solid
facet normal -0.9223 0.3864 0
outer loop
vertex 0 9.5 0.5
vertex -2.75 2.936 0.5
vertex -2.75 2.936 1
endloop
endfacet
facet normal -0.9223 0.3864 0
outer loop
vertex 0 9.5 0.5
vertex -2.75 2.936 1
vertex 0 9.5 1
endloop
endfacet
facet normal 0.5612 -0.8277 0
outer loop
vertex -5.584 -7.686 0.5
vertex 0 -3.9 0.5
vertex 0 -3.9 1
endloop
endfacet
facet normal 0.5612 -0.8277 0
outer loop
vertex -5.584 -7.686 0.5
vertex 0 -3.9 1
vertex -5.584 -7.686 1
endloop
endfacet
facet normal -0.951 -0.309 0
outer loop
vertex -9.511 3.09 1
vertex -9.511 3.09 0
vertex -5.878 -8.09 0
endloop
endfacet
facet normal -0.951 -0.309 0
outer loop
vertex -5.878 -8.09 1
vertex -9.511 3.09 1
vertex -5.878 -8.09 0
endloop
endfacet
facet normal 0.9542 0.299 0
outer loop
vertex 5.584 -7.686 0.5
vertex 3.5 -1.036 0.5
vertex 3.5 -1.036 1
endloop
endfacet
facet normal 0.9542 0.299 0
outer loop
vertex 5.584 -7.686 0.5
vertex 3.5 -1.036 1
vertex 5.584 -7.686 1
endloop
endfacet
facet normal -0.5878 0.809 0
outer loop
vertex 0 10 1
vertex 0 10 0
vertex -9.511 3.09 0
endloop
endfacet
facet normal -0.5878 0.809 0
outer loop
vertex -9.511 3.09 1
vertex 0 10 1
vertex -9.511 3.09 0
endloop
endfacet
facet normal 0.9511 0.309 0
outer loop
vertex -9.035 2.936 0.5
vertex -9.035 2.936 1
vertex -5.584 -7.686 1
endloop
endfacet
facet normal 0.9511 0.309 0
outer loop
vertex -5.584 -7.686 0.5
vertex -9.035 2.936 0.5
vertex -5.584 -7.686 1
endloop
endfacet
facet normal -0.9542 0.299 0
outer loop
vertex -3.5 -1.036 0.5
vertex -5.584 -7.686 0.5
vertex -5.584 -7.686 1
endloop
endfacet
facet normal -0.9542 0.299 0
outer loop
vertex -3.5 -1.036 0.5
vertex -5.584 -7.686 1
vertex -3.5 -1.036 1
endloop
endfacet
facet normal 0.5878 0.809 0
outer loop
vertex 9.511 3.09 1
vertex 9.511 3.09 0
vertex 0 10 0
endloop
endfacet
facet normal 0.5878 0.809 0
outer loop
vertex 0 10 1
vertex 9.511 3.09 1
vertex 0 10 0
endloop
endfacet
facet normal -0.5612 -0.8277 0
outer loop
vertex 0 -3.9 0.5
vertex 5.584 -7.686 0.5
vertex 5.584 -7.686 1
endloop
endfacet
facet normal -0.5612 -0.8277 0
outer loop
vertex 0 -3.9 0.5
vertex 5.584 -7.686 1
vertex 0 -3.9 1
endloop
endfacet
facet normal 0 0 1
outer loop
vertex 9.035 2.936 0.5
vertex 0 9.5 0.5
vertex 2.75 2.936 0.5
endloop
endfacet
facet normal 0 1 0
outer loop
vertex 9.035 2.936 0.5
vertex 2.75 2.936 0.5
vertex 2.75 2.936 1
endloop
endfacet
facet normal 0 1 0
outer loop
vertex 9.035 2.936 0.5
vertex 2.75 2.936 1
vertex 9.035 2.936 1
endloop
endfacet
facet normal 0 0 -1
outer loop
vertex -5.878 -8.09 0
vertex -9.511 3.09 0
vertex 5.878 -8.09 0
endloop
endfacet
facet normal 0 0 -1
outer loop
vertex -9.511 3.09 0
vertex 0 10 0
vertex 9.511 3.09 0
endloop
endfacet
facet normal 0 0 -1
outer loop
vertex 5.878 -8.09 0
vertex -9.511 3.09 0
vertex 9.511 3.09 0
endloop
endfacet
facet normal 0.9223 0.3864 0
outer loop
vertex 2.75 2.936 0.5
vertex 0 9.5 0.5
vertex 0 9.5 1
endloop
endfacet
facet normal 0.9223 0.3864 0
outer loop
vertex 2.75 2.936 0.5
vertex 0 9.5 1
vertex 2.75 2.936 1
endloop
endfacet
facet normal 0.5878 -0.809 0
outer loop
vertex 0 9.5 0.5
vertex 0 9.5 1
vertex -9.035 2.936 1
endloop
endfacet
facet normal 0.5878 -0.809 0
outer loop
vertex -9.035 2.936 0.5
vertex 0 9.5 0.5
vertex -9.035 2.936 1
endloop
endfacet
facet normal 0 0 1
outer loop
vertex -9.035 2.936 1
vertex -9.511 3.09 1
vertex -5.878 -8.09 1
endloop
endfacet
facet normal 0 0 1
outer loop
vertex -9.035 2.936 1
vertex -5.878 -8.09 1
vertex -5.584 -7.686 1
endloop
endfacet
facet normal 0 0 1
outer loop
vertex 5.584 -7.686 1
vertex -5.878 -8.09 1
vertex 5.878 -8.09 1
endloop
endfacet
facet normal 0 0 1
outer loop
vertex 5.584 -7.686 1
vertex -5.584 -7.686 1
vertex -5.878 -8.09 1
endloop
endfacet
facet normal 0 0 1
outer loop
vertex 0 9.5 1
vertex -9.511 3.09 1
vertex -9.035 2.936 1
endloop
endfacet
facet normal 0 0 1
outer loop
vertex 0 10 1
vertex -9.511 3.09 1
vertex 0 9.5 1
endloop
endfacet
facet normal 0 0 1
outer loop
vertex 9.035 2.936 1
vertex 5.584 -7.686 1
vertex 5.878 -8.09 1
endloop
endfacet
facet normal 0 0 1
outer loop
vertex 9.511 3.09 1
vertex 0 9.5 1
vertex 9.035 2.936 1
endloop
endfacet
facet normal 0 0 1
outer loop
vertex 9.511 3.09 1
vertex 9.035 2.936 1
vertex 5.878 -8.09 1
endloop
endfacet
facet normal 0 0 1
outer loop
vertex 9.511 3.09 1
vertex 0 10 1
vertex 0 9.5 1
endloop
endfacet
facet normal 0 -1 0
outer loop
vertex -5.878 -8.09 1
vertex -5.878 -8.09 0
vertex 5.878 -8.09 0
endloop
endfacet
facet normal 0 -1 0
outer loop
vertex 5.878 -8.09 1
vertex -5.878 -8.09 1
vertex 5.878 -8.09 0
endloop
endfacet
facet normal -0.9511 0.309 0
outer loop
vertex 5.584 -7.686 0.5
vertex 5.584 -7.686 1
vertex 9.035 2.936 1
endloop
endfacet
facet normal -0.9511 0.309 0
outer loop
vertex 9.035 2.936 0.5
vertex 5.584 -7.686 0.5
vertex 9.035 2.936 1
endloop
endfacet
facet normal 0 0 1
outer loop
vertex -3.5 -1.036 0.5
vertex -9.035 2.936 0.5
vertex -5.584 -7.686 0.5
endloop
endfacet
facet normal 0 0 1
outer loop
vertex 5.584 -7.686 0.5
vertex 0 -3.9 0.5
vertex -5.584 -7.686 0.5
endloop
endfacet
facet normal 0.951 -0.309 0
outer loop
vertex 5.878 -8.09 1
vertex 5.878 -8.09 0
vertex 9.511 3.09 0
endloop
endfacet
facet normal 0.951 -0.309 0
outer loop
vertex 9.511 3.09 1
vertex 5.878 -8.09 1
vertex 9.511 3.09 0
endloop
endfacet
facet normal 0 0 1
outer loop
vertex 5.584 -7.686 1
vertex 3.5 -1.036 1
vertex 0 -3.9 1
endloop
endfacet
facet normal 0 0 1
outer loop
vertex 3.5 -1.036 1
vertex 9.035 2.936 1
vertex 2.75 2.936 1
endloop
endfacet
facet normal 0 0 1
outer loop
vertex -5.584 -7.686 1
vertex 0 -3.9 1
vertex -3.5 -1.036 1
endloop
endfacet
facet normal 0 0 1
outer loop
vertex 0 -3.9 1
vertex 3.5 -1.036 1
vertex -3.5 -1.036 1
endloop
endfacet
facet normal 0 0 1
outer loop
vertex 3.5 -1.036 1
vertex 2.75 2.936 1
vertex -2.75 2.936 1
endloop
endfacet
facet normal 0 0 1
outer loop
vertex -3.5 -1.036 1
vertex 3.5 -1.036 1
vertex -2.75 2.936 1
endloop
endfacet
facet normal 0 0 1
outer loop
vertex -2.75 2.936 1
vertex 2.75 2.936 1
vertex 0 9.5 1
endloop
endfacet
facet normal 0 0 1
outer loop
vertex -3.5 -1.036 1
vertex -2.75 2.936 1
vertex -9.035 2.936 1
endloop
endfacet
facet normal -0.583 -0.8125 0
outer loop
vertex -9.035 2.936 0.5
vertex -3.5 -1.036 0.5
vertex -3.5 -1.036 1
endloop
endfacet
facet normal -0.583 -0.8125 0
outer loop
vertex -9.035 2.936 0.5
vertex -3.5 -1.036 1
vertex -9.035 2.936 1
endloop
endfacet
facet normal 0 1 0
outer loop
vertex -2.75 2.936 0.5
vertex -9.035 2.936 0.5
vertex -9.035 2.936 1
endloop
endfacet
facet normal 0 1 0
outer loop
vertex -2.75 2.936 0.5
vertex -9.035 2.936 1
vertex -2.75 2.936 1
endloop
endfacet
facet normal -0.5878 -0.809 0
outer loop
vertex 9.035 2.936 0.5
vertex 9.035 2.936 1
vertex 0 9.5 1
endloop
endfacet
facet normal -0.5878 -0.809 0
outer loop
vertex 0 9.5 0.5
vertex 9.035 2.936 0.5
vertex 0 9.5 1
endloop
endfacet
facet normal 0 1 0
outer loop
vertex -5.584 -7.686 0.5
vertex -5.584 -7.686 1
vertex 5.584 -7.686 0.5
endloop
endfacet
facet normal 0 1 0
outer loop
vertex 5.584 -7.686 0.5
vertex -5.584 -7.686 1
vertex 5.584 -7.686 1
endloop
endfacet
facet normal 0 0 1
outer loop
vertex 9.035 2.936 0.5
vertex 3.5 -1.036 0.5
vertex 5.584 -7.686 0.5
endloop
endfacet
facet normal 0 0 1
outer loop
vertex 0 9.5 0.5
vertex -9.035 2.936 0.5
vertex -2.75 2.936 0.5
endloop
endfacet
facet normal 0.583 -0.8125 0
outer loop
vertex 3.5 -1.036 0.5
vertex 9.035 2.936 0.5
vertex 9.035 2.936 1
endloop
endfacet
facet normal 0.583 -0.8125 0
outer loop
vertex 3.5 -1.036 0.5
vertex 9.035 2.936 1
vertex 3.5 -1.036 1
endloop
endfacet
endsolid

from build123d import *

# Parameters (mm, degrees)
PAD_DEPTH    = 1
POCKET_DEPTH = 0.5
PAD001_DEPTH = 0.5


with BuildPart() as part:
    # Sketch → Pad (new body)
    with BuildSketch(Plane.XY):
        Polygon((0, 10), (-9.510565, 3.09017), (-5.877853, -8.09017), (5.877853, -8.09017), (9.510565, 3.09017), align=None)
    extrude(amount=PAD_DEPTH)

    # Sketch001 (on Face7 of Pad) → Pocket (cut)
    with BuildSketch(Plane.XY.offset(1)):
        Polygon((0, 9.5), (-9.035037, 2.935661), (-5.58396, -7.685661), (5.58396, -7.685661), (9.035037, 2.935661), align=None)
    extrude(amount=-POCKET_DEPTH, mode=Mode.SUBTRACT)

    # Sketch002 (on Face13 of Pocket) → Pad001 (join)
    with BuildSketch(Plane.XY.offset(0.5)):
        Polygon((-9.035037, 2.935661), (-2.75, 2.935661), (0, 9.5), (2.75, 2.935661), (9.035037, 2.935661), (3.5, -1.035616), (5.58396, -7.685661), (0, -3.9), (-5.58396, -7.685661), (-3.5, -1.035616), align=None)
    extrude(amount=PAD001_DEPTH)


solid = part.part
